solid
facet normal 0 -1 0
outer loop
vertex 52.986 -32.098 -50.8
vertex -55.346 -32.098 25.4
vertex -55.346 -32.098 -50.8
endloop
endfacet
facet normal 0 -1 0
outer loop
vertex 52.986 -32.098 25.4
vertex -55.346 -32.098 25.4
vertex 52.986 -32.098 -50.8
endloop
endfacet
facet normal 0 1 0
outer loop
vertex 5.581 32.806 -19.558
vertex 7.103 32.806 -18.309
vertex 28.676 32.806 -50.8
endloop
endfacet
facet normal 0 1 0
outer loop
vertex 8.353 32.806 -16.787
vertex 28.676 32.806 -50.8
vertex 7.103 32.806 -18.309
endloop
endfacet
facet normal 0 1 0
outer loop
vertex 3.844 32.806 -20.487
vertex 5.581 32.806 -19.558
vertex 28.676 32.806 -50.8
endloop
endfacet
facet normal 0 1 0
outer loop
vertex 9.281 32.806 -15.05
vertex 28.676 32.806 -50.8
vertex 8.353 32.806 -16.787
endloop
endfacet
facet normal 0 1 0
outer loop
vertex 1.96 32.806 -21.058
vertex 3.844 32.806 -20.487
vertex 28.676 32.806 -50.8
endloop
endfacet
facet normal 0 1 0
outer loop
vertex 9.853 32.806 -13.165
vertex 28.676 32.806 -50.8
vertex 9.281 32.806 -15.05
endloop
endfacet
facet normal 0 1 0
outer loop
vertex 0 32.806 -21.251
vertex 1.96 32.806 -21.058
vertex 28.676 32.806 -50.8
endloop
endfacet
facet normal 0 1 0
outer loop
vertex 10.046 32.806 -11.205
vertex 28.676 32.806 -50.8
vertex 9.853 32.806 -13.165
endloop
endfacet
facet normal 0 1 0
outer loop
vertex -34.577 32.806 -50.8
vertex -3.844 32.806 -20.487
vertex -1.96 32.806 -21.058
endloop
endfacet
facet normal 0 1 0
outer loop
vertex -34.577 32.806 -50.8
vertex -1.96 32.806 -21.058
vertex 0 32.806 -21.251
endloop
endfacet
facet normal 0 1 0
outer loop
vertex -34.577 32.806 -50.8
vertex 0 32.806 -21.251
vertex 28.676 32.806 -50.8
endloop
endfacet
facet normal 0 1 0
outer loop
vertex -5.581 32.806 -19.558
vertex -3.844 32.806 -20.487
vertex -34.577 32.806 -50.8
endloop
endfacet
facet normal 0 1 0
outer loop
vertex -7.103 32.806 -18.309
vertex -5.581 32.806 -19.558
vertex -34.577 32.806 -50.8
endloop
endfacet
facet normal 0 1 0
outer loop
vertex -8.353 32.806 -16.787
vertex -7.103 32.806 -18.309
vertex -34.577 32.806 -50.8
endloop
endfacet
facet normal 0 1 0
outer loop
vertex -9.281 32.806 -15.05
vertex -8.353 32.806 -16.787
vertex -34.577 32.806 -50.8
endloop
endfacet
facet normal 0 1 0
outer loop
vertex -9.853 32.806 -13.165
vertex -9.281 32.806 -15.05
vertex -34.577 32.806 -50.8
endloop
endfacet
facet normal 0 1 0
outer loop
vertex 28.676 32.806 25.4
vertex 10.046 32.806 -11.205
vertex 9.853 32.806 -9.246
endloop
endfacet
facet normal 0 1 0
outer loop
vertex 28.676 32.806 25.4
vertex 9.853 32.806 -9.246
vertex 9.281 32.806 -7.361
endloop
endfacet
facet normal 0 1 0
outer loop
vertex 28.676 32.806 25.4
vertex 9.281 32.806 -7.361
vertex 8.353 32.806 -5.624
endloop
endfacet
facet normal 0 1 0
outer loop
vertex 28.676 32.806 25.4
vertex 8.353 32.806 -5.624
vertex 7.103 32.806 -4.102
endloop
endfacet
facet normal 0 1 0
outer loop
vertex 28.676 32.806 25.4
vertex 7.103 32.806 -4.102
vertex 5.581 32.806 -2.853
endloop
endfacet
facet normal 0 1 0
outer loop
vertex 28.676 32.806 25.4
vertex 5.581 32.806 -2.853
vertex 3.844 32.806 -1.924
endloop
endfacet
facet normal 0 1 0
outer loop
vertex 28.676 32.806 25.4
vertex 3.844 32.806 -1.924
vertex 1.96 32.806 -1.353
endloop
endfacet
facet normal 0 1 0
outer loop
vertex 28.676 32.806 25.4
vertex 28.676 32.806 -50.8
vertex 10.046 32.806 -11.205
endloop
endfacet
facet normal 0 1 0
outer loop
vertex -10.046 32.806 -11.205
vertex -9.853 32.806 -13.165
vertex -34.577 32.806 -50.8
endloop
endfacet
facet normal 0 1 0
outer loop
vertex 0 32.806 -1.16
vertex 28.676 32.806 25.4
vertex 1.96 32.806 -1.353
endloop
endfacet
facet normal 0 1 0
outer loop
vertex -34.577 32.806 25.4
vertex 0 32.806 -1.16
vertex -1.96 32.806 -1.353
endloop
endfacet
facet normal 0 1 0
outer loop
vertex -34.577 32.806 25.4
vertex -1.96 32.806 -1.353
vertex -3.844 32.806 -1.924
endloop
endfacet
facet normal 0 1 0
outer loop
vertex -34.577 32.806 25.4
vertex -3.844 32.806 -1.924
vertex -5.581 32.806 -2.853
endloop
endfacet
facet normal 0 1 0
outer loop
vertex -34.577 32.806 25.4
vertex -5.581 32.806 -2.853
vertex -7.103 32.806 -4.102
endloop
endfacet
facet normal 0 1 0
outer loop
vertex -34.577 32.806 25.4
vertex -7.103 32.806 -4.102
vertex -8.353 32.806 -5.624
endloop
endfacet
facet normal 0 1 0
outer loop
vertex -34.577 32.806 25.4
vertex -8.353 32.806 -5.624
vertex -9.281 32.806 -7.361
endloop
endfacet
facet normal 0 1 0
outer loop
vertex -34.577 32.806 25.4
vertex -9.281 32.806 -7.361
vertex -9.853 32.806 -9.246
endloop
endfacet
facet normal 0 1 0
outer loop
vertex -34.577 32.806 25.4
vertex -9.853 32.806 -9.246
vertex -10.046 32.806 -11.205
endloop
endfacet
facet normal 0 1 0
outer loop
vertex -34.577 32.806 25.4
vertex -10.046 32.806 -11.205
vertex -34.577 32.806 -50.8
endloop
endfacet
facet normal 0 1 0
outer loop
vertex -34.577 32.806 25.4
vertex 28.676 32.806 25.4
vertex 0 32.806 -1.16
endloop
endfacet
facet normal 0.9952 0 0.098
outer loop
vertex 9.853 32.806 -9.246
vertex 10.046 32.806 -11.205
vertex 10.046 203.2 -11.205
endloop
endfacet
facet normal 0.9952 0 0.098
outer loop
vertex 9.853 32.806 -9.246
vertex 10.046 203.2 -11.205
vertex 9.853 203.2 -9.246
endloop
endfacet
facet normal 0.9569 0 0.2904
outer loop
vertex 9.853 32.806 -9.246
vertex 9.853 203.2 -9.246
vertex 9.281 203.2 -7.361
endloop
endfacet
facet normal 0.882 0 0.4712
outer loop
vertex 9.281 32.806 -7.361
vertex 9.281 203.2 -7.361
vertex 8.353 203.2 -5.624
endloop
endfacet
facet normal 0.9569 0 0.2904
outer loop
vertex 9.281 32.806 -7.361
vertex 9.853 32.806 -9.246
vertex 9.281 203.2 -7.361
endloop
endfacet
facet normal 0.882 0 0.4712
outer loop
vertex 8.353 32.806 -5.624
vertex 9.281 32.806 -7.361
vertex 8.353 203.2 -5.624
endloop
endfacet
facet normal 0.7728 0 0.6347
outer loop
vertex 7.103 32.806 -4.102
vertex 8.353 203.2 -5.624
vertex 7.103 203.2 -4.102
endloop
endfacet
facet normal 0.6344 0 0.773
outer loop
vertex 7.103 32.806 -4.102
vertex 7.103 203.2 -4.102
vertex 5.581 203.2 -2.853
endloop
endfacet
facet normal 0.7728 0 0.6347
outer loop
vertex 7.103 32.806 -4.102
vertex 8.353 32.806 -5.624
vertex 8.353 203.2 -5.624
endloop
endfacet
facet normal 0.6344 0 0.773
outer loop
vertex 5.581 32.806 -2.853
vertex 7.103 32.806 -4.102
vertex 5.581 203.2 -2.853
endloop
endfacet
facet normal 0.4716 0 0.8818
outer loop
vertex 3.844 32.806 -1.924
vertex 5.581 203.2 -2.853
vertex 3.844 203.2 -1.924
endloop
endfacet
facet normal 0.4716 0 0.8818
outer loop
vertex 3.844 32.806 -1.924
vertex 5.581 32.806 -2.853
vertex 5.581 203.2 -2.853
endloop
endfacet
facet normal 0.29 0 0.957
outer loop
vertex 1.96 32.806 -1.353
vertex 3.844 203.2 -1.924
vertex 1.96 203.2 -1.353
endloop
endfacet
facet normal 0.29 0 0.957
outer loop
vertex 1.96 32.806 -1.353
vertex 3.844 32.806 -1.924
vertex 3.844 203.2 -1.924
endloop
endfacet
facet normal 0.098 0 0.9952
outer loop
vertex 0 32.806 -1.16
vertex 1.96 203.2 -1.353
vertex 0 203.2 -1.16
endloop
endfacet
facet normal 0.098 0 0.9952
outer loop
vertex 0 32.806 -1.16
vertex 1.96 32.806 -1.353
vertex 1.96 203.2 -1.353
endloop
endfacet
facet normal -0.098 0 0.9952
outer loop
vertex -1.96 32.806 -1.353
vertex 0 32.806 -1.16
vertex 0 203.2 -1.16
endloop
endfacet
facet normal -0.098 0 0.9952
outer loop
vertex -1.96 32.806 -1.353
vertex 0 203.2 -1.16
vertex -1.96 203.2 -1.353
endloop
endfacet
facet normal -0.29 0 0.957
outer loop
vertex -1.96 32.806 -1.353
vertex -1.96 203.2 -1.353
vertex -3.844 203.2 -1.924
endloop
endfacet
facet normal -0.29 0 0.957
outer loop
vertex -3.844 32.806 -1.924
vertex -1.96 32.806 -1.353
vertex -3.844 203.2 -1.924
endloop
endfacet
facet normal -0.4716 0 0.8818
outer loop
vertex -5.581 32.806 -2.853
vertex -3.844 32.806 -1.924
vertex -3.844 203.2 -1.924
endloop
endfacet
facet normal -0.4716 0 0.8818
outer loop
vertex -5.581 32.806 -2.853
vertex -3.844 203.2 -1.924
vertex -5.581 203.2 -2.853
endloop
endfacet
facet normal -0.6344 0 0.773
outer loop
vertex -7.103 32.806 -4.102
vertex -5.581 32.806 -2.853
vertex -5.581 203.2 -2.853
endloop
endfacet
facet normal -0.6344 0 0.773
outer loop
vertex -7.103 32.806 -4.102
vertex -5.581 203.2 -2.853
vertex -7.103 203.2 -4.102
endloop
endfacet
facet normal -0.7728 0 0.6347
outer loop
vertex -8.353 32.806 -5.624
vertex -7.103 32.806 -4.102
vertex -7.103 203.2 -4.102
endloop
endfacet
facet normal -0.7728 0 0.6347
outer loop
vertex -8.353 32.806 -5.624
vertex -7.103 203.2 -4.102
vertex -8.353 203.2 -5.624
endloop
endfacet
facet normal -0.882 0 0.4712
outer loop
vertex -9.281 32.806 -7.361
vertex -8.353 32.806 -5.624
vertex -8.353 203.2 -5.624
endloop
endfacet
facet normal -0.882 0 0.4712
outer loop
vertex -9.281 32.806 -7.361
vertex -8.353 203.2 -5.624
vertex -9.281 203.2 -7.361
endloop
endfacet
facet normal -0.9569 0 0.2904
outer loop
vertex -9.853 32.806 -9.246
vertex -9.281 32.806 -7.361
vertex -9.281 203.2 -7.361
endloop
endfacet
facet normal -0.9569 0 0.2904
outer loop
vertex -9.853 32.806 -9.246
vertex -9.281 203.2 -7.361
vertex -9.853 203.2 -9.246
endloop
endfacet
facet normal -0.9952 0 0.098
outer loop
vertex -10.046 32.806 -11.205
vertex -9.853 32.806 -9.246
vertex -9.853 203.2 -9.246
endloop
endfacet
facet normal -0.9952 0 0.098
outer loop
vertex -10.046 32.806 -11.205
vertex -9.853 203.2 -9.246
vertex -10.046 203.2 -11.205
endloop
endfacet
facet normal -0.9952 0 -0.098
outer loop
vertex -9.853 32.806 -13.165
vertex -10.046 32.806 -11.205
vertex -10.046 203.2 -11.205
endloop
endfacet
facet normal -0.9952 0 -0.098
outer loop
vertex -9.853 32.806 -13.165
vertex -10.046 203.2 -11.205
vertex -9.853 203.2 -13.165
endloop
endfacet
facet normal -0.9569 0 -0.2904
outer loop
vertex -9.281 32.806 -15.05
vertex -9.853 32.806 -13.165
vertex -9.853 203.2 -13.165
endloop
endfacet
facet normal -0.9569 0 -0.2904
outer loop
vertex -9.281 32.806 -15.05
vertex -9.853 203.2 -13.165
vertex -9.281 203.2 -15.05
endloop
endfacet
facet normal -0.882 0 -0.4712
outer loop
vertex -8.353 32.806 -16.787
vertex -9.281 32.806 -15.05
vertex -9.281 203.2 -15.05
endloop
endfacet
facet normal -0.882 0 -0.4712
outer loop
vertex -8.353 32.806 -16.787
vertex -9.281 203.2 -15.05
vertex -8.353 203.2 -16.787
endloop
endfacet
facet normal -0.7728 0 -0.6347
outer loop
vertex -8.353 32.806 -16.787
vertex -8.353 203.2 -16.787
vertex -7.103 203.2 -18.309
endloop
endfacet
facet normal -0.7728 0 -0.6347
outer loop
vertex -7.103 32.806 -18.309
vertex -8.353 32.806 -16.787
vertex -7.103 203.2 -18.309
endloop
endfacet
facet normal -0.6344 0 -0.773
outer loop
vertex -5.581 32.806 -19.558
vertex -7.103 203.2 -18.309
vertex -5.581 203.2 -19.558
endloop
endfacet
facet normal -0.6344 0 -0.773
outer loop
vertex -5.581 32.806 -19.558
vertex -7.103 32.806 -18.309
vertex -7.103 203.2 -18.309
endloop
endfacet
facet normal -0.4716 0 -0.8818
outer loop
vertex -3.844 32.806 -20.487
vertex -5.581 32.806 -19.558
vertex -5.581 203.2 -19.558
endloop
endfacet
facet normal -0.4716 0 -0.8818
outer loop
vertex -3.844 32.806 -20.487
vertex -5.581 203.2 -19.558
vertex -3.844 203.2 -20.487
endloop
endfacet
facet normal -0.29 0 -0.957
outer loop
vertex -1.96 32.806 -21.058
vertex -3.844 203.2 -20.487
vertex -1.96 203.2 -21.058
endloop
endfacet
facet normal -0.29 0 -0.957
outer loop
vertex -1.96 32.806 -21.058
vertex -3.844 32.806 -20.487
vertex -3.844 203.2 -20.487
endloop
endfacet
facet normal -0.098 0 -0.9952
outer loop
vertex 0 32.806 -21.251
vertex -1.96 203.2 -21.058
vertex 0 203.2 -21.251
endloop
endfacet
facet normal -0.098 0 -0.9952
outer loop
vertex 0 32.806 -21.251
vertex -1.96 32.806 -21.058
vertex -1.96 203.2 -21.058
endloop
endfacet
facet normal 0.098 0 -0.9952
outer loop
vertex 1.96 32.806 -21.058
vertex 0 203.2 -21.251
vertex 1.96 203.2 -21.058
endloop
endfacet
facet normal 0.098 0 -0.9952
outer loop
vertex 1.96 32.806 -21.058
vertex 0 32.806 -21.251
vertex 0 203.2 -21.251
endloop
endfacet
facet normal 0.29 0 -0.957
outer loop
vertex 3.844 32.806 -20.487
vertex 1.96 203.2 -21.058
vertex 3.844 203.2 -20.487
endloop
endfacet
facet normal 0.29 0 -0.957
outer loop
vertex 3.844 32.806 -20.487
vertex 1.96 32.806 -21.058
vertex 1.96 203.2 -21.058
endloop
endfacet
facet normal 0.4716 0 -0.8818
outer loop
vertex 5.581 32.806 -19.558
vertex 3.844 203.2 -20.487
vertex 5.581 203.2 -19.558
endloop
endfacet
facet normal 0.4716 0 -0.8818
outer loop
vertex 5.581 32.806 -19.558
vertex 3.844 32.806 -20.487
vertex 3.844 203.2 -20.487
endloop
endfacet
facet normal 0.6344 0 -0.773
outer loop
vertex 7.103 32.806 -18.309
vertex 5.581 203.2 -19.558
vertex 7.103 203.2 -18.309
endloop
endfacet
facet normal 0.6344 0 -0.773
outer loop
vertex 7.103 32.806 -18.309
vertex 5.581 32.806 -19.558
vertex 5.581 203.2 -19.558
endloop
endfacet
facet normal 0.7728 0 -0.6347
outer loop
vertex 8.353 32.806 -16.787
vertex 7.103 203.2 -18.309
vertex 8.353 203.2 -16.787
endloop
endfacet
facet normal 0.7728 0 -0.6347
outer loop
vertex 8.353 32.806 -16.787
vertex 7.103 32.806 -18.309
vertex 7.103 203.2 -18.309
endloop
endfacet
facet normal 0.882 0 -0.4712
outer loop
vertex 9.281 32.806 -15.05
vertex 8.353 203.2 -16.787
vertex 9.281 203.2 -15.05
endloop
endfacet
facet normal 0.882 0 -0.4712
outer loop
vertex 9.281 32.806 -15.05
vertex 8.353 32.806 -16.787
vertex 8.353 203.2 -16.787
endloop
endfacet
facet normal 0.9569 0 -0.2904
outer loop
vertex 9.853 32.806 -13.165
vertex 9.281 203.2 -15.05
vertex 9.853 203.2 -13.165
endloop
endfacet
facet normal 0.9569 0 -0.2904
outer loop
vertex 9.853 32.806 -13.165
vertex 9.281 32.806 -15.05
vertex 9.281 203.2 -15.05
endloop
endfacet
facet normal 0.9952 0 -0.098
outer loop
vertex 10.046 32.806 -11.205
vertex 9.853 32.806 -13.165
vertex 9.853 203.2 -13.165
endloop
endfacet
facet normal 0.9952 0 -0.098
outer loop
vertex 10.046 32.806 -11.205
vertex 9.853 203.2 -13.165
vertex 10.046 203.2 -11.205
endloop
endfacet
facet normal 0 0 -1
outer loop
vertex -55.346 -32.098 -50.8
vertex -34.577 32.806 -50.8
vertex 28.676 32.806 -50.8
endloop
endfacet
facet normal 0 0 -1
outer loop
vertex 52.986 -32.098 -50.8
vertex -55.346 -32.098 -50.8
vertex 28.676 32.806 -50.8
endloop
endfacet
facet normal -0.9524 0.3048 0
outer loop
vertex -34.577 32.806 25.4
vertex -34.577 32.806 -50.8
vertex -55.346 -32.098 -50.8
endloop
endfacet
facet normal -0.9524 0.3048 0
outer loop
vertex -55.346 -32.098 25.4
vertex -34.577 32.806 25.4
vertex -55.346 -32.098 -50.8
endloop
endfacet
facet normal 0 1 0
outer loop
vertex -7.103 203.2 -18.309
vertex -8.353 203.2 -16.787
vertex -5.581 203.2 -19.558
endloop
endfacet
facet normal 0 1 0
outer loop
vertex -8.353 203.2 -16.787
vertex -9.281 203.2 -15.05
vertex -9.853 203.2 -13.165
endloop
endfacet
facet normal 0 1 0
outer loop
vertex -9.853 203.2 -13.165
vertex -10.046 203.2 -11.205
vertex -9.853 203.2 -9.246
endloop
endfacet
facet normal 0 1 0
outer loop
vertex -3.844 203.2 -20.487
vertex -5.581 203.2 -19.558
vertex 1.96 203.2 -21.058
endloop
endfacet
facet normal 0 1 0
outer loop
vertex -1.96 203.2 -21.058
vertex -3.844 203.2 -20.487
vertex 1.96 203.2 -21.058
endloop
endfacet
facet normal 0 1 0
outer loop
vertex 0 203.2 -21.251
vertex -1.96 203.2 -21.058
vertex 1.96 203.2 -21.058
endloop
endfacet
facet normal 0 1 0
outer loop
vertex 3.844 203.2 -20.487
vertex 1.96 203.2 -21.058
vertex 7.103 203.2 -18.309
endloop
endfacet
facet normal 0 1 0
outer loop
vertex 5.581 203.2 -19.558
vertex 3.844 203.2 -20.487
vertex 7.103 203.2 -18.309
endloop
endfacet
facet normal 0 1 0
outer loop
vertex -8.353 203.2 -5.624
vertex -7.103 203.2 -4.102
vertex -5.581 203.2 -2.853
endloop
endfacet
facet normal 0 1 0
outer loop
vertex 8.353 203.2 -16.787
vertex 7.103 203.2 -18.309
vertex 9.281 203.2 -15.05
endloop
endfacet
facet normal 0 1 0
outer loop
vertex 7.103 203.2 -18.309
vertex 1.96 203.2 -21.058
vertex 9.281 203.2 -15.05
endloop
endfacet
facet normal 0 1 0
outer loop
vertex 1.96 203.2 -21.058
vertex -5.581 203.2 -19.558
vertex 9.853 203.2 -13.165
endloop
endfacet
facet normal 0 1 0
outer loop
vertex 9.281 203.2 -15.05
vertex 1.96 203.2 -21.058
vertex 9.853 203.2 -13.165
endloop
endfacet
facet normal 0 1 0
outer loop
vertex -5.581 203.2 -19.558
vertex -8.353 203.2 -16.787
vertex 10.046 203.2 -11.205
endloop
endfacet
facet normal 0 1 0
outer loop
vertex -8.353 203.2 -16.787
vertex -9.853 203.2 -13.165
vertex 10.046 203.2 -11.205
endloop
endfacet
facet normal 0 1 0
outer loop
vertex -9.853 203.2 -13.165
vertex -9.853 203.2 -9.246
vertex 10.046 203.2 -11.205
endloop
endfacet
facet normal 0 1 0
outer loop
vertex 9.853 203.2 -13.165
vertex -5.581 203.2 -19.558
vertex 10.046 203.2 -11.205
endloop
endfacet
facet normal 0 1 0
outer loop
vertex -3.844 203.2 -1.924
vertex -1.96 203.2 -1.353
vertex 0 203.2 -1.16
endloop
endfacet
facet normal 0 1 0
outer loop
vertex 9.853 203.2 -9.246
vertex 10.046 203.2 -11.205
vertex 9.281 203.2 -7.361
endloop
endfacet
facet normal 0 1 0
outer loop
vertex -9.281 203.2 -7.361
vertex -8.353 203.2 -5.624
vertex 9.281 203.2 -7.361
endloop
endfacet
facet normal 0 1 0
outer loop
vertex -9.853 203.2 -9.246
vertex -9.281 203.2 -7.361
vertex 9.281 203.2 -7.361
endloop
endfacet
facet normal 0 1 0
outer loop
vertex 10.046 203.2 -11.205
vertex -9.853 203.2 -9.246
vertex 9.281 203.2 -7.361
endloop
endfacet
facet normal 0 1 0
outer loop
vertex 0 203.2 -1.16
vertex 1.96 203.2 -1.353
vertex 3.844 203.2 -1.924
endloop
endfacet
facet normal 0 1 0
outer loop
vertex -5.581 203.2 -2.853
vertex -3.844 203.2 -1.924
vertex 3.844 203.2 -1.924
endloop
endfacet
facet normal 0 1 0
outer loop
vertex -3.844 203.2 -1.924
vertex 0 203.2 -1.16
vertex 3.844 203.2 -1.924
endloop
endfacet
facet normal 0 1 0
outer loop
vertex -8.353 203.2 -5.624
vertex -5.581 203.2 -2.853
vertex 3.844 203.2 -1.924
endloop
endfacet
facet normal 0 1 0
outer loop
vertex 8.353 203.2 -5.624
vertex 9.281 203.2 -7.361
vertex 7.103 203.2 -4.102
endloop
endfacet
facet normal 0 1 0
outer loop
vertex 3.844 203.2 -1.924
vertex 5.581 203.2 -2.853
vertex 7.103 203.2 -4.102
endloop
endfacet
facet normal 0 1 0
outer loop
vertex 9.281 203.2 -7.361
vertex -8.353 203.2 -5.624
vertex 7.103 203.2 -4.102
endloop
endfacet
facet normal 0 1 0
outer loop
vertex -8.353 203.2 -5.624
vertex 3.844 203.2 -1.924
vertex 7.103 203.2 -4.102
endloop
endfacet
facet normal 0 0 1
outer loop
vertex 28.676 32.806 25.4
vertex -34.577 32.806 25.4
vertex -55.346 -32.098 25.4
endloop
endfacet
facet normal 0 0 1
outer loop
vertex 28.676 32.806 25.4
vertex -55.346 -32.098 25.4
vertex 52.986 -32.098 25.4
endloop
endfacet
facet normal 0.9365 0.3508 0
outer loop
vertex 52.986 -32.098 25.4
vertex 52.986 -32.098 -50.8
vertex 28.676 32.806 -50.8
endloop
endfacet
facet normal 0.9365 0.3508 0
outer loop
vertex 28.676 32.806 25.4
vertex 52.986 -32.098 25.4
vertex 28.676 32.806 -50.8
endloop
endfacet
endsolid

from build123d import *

# Parameters (mm, degrees)
F1_DEPTH = 25.4
F2_DEPTH = 50.8
F3_R     = 10.0458196752
F4_DEPTH = 203.2


# Not quite as in the source:
# - the program builds the solid bodies; features that only make, move or delete a surface that nothing else refers to are left out


with BuildPart() as f1:
    # F0 (on Top) → F1 (new body)
    with BuildSketch(Plane.XY):
        Polygon((28.6761522293, 32.8064598143), (-34.5765948296, 32.8064598143), (-55.3461499512, -32.0984050632), (52.9859773815, -32.0984050632), align=None)
    extrude(amount=F1_DEPTH)

    # F2 (add): a face of the model
    f2_faces = [f1.faces().sort_by_distance(p)[0] for p in [
        (-1.9876444454, -2.4879782653, 0),
    ]]
    extrude(f2_faces, amount=F2_DEPTH)

    # F3 (on Front) → F4 (join)
    with BuildSketch(Plane.XZ):
        with Locations((0, -11.2053733319)):
            Circle(F3_R)
    extrude(amount=-F4_DEPTH)


solid = f1.part
